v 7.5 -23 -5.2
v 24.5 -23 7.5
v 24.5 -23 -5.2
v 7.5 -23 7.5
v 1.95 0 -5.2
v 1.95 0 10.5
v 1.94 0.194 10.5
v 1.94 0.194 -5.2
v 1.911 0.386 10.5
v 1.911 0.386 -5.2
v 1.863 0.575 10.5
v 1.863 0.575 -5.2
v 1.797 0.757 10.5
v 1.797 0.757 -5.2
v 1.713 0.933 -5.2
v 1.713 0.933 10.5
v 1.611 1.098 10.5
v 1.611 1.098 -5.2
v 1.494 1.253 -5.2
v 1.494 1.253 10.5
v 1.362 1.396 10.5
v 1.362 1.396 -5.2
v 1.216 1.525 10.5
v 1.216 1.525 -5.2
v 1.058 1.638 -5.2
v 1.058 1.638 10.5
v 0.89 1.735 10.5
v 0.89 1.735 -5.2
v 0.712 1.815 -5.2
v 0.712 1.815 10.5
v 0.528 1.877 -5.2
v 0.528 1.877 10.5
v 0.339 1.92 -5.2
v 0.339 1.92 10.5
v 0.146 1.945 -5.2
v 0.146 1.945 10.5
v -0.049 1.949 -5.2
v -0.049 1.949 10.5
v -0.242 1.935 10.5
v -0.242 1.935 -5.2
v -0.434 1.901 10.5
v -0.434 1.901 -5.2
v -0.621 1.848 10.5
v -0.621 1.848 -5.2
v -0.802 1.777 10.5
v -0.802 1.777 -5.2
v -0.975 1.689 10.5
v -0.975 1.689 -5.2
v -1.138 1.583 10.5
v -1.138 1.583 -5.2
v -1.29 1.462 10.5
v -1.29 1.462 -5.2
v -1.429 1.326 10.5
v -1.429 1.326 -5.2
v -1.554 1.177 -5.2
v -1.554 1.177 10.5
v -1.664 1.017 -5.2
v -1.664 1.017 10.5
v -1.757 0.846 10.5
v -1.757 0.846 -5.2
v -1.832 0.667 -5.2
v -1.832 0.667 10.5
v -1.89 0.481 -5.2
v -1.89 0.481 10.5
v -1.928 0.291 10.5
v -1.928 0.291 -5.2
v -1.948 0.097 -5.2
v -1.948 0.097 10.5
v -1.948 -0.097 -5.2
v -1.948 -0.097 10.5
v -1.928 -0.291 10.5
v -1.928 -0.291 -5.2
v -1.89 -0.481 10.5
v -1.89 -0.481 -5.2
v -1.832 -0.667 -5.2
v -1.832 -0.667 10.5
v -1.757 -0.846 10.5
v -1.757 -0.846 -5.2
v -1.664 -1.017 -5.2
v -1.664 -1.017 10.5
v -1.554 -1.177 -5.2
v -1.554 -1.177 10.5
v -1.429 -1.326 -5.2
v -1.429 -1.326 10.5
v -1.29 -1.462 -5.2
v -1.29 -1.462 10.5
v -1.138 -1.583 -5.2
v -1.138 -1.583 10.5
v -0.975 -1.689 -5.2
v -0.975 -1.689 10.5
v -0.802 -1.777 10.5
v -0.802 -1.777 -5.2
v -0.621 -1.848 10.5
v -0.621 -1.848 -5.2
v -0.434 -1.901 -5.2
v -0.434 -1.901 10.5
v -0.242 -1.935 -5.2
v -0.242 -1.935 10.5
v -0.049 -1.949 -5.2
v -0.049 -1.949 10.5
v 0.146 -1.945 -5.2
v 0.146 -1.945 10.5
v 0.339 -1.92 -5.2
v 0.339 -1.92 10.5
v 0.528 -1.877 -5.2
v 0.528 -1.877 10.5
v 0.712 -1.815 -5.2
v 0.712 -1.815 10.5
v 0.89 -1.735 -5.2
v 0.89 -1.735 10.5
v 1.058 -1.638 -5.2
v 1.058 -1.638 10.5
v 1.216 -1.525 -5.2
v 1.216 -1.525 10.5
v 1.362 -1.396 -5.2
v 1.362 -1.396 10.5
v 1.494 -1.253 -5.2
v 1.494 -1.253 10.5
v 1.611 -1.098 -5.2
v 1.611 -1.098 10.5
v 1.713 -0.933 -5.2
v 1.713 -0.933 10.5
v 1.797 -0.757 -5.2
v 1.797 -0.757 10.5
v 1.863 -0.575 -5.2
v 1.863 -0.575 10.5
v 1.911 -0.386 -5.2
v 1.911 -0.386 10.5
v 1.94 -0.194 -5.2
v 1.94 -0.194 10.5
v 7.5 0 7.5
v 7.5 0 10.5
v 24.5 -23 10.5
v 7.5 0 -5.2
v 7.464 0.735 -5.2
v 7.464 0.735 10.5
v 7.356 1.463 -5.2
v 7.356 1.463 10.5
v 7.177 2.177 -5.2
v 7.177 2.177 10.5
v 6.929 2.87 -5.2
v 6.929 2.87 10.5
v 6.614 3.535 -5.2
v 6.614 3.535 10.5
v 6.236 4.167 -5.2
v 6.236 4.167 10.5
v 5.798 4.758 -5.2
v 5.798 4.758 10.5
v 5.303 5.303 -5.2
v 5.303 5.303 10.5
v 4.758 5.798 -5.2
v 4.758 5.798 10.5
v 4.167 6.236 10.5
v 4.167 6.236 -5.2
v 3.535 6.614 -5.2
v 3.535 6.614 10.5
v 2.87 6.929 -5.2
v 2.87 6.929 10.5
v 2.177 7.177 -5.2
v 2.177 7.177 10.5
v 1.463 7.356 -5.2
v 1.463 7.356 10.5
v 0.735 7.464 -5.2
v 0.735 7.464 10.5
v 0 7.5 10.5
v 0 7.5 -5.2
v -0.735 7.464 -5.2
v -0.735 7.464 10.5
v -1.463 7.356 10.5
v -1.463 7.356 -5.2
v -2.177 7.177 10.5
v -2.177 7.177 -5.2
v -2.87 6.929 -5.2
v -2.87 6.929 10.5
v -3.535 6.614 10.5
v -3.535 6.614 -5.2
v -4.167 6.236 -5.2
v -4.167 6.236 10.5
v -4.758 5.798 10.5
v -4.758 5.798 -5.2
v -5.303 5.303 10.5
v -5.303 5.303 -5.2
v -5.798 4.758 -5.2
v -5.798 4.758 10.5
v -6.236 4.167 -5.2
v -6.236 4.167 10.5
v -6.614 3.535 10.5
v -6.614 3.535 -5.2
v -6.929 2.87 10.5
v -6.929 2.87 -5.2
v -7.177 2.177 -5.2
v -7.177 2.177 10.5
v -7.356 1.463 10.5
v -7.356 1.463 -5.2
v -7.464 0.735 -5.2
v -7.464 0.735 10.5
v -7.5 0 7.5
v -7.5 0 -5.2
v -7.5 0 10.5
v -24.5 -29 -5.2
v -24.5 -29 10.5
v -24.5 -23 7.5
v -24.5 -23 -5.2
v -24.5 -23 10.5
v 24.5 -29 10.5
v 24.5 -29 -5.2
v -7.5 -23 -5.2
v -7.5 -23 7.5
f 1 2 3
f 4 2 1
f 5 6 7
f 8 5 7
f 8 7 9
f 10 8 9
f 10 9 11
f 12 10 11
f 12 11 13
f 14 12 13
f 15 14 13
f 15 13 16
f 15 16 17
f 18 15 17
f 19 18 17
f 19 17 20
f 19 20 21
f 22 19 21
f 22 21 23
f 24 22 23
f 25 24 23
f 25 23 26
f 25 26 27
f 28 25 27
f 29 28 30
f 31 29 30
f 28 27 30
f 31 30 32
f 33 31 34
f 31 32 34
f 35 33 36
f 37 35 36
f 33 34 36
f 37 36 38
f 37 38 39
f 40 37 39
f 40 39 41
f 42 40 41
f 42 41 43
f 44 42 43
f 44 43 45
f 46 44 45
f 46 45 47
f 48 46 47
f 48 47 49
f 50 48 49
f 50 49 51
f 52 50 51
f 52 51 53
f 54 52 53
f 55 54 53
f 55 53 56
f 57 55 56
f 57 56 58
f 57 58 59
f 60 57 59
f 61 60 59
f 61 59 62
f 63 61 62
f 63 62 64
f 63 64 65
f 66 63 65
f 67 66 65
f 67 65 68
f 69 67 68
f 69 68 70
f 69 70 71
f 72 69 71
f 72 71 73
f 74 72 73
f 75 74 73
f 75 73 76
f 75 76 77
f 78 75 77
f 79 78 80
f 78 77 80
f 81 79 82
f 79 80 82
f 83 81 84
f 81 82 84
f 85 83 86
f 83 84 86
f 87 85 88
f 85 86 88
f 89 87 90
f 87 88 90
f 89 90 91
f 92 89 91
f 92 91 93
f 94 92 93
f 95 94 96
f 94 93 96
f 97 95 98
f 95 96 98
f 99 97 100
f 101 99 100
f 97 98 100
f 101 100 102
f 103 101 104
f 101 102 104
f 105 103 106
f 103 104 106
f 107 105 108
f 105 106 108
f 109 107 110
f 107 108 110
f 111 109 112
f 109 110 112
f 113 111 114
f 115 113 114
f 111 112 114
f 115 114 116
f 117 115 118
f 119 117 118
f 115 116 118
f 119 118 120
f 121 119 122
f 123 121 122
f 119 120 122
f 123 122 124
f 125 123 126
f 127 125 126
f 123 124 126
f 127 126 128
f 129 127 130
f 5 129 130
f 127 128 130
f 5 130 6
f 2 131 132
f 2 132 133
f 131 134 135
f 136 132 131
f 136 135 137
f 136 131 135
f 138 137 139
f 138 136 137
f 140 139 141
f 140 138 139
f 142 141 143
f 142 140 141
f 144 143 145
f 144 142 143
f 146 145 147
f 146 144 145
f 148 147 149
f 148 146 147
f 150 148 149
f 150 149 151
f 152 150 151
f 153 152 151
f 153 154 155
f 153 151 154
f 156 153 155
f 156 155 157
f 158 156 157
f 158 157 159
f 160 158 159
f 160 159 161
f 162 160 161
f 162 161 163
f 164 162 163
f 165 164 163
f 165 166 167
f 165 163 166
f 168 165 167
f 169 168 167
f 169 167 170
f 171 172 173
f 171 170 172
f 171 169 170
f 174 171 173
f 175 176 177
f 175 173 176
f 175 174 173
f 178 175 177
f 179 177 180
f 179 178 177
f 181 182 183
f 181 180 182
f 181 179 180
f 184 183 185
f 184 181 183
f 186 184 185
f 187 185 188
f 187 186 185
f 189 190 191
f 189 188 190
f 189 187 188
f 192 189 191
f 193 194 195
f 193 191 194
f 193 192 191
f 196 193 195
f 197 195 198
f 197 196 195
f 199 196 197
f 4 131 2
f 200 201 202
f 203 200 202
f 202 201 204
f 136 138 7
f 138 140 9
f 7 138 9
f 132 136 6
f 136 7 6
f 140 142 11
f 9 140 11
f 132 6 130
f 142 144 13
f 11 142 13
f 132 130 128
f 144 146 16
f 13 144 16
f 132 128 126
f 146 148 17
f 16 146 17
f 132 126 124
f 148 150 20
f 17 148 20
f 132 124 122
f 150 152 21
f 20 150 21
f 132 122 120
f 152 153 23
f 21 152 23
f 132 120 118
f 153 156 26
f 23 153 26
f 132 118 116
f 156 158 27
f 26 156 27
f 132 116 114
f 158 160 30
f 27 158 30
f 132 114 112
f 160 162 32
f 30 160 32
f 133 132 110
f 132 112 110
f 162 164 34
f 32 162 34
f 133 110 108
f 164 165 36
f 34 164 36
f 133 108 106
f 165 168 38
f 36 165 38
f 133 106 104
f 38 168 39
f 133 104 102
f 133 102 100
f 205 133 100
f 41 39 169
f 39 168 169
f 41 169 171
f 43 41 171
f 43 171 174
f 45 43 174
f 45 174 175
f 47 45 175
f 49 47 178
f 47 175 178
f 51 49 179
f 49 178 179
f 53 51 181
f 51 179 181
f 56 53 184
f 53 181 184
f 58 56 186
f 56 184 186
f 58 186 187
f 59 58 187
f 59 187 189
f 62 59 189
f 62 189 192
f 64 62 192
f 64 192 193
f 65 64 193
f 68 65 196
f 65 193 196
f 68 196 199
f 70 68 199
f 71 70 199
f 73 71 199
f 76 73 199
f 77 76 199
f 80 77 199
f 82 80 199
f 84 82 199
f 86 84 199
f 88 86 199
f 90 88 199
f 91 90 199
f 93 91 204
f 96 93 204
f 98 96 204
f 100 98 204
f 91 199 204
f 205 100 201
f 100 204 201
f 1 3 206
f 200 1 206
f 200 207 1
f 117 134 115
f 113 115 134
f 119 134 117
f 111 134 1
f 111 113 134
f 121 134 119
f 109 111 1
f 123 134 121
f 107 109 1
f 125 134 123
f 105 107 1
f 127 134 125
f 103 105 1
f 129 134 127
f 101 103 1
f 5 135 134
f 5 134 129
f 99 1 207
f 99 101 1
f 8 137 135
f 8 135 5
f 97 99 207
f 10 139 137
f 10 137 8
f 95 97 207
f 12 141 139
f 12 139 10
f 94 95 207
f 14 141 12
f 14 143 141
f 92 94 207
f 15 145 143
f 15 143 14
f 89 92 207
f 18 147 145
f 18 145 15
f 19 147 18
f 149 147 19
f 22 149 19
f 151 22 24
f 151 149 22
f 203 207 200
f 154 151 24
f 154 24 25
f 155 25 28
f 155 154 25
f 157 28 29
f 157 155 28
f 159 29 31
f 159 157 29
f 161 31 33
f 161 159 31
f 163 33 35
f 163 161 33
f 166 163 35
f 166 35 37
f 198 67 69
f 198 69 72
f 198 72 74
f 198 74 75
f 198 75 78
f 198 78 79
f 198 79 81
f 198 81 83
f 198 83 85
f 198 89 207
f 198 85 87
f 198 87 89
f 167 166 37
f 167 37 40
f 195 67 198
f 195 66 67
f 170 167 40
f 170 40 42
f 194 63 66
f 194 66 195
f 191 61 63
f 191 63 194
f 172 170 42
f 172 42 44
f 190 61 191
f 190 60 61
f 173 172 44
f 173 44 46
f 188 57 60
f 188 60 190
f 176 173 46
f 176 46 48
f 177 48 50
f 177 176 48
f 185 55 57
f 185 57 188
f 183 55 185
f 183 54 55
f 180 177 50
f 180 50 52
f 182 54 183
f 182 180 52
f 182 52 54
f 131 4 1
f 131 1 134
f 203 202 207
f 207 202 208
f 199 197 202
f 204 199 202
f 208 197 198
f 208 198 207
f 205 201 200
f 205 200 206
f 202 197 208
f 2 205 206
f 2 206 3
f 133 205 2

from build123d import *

# Parameters (mm, degrees)
MAIN_BODY_DEPTH    = 10.5
RIB1_REACH         = 45.385
SKETCH2_WALL_W     = 117.37050971
SKETCH2_WALL_H     = 3
SKETCH3_R          = 7.5
SHAFT_DEPTH        = 8
CUT_EXTRUDE1_START = -5.3
CUT_EXTRUDE1_DEPTH = 5.3
CUT_EXTRUDE2_START = -13.3
SKETCH6_R          = 7.5
CUT_EXTRUDE2_DEPTH = 13.3
SKETCH7_R          = 1.95
CUT_EXTRUDE3_DEPTH = 42.082112896


with BuildPart() as part:
    # Sketch1 → Main Body (new, symmetric)
    with BuildSketch(Plane.XY):
        with BuildLine():
            Line((-7.5, 0), (-7.5, -29))
            Line((-7.5, -29), (24.5, -29))
            Line((24.5, -29), (24.5, -23))
            Line((24.5, -23), (7.5, -23))
            Line((7.5, -23), (7.5, 0))
            ThreePointArc((7.5, 0), (0, 7.5), (-7.5, 0))
        make_face()
    main_body = extrude(amount=MAIN_BODY_DEPTH, both=True)

    # Sketch2 wall → Rib1 (add, up to next)
    with BuildSketch(Plane(origin=(16, -11.5, 10.5), x_dir=(0.594391061084, -0.804176141466, 0), z_dir=(0.804176141466, 0.594391061084, 0)), mode=Mode.PRIVATE) as rib1_sk1:
        with Locations((0, 1.5)):
            Rectangle(SKETCH2_WALL_W, SKETCH2_WALL_H)
    rib1_tool1 = extrude(rib1_sk1.sketch, amount=-RIB1_REACH, mode=Mode.PRIVATE) - part.part
    rib1 = rib1_tool1.solids().sort_by_distance((16, -11.5, 10.5))[0]
    add(rib1)

    # Sketch3 → Shaft (add)
    with BuildSketch(Plane.XY.offset(-10.5)):
        Circle(SKETCH3_R)
    extrude(amount=-SHAFT_DEPTH)

    # Mirror2: Main Body, Rib1 across plane
    add(main_body.mirror(Plane(origin=(0, 0, 0), x_dir=(0, 0, 1), z_dir=(1, 0, 0))))
    add(rib1.mirror(Plane(origin=(0, 0, 0), x_dir=(0, 0, 1), z_dir=(1, 0, 0))))

    # Sketch5 → Cut-Extrude1 (cut)
    with BuildSketch(Plane(origin=(0, 0, -10.5), x_dir=(-1, 0, 0), z_dir=(0, 0, -1)).offset(CUT_EXTRUDE1_START)):
        with BuildLine():
            Line((-7.5, 0), (-7.5, -23))
            Line((-7.5, -23), (-24.5, -23))
            Line((-24.5, -23), (-24.5, -29))
            Line((-24.5, -29), (24.5, -29))
            Line((24.5, -29), (24.5, -23))
            Line((24.5, -23), (7.5, -23))
            Line((7.5, -23), (7.5, 0))
            ThreePointArc((7.5, 0), (0, -7.5), (-7.5, 0))
        make_face()
    extrude(amount=CUT_EXTRUDE1_DEPTH, mode=Mode.SUBTRACT)

    # Sketch6 → Cut-Extrude2 (cut)
    with BuildSketch(Plane(origin=(0, 0, -18.5), x_dir=(-1, 0, 0), z_dir=(0, 0, -1)).offset(CUT_EXTRUDE2_START)):
        Circle(SKETCH6_R)
    extrude(amount=CUT_EXTRUDE2_DEPTH, mode=Mode.SUBTRACT)

    # Sketch7 → Cut-Extrude3 (cut, through all)
    with BuildSketch(Plane.XY.offset(10.5)):
        Circle(SKETCH7_R)
    extrude(amount=-CUT_EXTRUDE3_DEPTH, mode=Mode.SUBTRACT)


solid = part.part
